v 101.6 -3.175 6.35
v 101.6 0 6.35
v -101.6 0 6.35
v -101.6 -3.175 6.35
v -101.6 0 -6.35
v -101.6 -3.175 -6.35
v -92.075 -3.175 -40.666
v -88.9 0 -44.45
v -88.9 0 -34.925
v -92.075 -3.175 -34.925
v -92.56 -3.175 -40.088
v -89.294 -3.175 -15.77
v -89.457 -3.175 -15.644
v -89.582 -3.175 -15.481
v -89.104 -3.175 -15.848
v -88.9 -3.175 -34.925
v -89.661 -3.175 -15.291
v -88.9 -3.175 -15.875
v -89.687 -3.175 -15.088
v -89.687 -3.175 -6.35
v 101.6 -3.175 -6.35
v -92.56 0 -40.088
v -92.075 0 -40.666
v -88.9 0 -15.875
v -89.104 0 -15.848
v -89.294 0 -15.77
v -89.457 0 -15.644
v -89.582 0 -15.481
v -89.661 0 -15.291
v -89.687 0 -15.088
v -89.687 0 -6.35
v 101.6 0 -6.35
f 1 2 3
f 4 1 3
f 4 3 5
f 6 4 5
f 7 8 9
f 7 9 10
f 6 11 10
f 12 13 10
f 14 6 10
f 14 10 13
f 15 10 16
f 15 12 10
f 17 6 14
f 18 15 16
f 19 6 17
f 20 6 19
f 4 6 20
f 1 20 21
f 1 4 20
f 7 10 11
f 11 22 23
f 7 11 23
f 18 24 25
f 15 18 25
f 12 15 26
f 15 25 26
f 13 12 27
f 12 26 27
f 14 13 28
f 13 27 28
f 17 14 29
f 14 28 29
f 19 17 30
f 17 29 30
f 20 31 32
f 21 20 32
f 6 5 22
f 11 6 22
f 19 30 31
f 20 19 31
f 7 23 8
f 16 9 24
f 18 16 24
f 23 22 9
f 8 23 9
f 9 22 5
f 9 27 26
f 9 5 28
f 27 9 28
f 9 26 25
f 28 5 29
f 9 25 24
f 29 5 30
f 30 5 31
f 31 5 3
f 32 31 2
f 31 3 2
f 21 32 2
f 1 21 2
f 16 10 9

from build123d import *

# Parameters (mm, degrees)
F1_DEPTH = 3.175
F3_DEPTH = 9.525
F5_DEPTH = 3.176


# Not quite as in the source:
# - a feature names something its author has since deleted; it is built from what else it names


with BuildPart() as f1:
    # F0 (on Front) → F1 (new body)
    with BuildSketch(Plane.XZ):
        with BuildLine():
            Line((101.6, 6.35), (-101.6, 6.35))
            Line((-101.6, 6.35), (-101.6, -6.35))
            Line((-101.6, -6.35), (-92.5598257878, -40.0883894691))
            Line((-92.5598257878, -40.0883894691), (-92.075, -40.6661823435))
            Line((-92.075, -40.6661823435), (-92.075, -34.925))
            Line((-92.075, -34.925), (-88.9, -34.925))
            Line((-88.9, -34.925), (-88.9, -15.875))
            ThreePointArc((-88.9, -15.875), (-89.4567758795, -15.6443758795), (-89.6874, -15.0876))
            Line((-89.6874, -15.0876), (-89.6874, -6.35))
            Line((-89.6874, -6.35), (101.6, -6.35))
            Line((101.6, -6.35), (101.6, 6.35))
        make_face()
    extrude(amount=F1_DEPTH)

    # F2 (on face) → F3 (join)
    with BuildSketch(Plane(origin=(0, 0, -34.925), x_dir=(1, 0, 0), z_dir=(0, 0, -1))):
        Polygon((-88.9, 0), (-92.075, 3.175), (-92.075, 0), align=None)
    extrude(amount=F3_DEPTH)

    # F4 (on face) → F5 (cut, through all)
    with BuildSketch(Plane(origin=(0, 0, 0), x_dir=(-1, 0, 0), z_dir=(0, 1, 0))):
        Polygon((92.075, -44.45), (92.075, -40.6661823435), (88.9, -44.45), align=None)
    extrude(amount=-F5_DEPTH, mode=Mode.SUBTRACT)


solid = f1.part
